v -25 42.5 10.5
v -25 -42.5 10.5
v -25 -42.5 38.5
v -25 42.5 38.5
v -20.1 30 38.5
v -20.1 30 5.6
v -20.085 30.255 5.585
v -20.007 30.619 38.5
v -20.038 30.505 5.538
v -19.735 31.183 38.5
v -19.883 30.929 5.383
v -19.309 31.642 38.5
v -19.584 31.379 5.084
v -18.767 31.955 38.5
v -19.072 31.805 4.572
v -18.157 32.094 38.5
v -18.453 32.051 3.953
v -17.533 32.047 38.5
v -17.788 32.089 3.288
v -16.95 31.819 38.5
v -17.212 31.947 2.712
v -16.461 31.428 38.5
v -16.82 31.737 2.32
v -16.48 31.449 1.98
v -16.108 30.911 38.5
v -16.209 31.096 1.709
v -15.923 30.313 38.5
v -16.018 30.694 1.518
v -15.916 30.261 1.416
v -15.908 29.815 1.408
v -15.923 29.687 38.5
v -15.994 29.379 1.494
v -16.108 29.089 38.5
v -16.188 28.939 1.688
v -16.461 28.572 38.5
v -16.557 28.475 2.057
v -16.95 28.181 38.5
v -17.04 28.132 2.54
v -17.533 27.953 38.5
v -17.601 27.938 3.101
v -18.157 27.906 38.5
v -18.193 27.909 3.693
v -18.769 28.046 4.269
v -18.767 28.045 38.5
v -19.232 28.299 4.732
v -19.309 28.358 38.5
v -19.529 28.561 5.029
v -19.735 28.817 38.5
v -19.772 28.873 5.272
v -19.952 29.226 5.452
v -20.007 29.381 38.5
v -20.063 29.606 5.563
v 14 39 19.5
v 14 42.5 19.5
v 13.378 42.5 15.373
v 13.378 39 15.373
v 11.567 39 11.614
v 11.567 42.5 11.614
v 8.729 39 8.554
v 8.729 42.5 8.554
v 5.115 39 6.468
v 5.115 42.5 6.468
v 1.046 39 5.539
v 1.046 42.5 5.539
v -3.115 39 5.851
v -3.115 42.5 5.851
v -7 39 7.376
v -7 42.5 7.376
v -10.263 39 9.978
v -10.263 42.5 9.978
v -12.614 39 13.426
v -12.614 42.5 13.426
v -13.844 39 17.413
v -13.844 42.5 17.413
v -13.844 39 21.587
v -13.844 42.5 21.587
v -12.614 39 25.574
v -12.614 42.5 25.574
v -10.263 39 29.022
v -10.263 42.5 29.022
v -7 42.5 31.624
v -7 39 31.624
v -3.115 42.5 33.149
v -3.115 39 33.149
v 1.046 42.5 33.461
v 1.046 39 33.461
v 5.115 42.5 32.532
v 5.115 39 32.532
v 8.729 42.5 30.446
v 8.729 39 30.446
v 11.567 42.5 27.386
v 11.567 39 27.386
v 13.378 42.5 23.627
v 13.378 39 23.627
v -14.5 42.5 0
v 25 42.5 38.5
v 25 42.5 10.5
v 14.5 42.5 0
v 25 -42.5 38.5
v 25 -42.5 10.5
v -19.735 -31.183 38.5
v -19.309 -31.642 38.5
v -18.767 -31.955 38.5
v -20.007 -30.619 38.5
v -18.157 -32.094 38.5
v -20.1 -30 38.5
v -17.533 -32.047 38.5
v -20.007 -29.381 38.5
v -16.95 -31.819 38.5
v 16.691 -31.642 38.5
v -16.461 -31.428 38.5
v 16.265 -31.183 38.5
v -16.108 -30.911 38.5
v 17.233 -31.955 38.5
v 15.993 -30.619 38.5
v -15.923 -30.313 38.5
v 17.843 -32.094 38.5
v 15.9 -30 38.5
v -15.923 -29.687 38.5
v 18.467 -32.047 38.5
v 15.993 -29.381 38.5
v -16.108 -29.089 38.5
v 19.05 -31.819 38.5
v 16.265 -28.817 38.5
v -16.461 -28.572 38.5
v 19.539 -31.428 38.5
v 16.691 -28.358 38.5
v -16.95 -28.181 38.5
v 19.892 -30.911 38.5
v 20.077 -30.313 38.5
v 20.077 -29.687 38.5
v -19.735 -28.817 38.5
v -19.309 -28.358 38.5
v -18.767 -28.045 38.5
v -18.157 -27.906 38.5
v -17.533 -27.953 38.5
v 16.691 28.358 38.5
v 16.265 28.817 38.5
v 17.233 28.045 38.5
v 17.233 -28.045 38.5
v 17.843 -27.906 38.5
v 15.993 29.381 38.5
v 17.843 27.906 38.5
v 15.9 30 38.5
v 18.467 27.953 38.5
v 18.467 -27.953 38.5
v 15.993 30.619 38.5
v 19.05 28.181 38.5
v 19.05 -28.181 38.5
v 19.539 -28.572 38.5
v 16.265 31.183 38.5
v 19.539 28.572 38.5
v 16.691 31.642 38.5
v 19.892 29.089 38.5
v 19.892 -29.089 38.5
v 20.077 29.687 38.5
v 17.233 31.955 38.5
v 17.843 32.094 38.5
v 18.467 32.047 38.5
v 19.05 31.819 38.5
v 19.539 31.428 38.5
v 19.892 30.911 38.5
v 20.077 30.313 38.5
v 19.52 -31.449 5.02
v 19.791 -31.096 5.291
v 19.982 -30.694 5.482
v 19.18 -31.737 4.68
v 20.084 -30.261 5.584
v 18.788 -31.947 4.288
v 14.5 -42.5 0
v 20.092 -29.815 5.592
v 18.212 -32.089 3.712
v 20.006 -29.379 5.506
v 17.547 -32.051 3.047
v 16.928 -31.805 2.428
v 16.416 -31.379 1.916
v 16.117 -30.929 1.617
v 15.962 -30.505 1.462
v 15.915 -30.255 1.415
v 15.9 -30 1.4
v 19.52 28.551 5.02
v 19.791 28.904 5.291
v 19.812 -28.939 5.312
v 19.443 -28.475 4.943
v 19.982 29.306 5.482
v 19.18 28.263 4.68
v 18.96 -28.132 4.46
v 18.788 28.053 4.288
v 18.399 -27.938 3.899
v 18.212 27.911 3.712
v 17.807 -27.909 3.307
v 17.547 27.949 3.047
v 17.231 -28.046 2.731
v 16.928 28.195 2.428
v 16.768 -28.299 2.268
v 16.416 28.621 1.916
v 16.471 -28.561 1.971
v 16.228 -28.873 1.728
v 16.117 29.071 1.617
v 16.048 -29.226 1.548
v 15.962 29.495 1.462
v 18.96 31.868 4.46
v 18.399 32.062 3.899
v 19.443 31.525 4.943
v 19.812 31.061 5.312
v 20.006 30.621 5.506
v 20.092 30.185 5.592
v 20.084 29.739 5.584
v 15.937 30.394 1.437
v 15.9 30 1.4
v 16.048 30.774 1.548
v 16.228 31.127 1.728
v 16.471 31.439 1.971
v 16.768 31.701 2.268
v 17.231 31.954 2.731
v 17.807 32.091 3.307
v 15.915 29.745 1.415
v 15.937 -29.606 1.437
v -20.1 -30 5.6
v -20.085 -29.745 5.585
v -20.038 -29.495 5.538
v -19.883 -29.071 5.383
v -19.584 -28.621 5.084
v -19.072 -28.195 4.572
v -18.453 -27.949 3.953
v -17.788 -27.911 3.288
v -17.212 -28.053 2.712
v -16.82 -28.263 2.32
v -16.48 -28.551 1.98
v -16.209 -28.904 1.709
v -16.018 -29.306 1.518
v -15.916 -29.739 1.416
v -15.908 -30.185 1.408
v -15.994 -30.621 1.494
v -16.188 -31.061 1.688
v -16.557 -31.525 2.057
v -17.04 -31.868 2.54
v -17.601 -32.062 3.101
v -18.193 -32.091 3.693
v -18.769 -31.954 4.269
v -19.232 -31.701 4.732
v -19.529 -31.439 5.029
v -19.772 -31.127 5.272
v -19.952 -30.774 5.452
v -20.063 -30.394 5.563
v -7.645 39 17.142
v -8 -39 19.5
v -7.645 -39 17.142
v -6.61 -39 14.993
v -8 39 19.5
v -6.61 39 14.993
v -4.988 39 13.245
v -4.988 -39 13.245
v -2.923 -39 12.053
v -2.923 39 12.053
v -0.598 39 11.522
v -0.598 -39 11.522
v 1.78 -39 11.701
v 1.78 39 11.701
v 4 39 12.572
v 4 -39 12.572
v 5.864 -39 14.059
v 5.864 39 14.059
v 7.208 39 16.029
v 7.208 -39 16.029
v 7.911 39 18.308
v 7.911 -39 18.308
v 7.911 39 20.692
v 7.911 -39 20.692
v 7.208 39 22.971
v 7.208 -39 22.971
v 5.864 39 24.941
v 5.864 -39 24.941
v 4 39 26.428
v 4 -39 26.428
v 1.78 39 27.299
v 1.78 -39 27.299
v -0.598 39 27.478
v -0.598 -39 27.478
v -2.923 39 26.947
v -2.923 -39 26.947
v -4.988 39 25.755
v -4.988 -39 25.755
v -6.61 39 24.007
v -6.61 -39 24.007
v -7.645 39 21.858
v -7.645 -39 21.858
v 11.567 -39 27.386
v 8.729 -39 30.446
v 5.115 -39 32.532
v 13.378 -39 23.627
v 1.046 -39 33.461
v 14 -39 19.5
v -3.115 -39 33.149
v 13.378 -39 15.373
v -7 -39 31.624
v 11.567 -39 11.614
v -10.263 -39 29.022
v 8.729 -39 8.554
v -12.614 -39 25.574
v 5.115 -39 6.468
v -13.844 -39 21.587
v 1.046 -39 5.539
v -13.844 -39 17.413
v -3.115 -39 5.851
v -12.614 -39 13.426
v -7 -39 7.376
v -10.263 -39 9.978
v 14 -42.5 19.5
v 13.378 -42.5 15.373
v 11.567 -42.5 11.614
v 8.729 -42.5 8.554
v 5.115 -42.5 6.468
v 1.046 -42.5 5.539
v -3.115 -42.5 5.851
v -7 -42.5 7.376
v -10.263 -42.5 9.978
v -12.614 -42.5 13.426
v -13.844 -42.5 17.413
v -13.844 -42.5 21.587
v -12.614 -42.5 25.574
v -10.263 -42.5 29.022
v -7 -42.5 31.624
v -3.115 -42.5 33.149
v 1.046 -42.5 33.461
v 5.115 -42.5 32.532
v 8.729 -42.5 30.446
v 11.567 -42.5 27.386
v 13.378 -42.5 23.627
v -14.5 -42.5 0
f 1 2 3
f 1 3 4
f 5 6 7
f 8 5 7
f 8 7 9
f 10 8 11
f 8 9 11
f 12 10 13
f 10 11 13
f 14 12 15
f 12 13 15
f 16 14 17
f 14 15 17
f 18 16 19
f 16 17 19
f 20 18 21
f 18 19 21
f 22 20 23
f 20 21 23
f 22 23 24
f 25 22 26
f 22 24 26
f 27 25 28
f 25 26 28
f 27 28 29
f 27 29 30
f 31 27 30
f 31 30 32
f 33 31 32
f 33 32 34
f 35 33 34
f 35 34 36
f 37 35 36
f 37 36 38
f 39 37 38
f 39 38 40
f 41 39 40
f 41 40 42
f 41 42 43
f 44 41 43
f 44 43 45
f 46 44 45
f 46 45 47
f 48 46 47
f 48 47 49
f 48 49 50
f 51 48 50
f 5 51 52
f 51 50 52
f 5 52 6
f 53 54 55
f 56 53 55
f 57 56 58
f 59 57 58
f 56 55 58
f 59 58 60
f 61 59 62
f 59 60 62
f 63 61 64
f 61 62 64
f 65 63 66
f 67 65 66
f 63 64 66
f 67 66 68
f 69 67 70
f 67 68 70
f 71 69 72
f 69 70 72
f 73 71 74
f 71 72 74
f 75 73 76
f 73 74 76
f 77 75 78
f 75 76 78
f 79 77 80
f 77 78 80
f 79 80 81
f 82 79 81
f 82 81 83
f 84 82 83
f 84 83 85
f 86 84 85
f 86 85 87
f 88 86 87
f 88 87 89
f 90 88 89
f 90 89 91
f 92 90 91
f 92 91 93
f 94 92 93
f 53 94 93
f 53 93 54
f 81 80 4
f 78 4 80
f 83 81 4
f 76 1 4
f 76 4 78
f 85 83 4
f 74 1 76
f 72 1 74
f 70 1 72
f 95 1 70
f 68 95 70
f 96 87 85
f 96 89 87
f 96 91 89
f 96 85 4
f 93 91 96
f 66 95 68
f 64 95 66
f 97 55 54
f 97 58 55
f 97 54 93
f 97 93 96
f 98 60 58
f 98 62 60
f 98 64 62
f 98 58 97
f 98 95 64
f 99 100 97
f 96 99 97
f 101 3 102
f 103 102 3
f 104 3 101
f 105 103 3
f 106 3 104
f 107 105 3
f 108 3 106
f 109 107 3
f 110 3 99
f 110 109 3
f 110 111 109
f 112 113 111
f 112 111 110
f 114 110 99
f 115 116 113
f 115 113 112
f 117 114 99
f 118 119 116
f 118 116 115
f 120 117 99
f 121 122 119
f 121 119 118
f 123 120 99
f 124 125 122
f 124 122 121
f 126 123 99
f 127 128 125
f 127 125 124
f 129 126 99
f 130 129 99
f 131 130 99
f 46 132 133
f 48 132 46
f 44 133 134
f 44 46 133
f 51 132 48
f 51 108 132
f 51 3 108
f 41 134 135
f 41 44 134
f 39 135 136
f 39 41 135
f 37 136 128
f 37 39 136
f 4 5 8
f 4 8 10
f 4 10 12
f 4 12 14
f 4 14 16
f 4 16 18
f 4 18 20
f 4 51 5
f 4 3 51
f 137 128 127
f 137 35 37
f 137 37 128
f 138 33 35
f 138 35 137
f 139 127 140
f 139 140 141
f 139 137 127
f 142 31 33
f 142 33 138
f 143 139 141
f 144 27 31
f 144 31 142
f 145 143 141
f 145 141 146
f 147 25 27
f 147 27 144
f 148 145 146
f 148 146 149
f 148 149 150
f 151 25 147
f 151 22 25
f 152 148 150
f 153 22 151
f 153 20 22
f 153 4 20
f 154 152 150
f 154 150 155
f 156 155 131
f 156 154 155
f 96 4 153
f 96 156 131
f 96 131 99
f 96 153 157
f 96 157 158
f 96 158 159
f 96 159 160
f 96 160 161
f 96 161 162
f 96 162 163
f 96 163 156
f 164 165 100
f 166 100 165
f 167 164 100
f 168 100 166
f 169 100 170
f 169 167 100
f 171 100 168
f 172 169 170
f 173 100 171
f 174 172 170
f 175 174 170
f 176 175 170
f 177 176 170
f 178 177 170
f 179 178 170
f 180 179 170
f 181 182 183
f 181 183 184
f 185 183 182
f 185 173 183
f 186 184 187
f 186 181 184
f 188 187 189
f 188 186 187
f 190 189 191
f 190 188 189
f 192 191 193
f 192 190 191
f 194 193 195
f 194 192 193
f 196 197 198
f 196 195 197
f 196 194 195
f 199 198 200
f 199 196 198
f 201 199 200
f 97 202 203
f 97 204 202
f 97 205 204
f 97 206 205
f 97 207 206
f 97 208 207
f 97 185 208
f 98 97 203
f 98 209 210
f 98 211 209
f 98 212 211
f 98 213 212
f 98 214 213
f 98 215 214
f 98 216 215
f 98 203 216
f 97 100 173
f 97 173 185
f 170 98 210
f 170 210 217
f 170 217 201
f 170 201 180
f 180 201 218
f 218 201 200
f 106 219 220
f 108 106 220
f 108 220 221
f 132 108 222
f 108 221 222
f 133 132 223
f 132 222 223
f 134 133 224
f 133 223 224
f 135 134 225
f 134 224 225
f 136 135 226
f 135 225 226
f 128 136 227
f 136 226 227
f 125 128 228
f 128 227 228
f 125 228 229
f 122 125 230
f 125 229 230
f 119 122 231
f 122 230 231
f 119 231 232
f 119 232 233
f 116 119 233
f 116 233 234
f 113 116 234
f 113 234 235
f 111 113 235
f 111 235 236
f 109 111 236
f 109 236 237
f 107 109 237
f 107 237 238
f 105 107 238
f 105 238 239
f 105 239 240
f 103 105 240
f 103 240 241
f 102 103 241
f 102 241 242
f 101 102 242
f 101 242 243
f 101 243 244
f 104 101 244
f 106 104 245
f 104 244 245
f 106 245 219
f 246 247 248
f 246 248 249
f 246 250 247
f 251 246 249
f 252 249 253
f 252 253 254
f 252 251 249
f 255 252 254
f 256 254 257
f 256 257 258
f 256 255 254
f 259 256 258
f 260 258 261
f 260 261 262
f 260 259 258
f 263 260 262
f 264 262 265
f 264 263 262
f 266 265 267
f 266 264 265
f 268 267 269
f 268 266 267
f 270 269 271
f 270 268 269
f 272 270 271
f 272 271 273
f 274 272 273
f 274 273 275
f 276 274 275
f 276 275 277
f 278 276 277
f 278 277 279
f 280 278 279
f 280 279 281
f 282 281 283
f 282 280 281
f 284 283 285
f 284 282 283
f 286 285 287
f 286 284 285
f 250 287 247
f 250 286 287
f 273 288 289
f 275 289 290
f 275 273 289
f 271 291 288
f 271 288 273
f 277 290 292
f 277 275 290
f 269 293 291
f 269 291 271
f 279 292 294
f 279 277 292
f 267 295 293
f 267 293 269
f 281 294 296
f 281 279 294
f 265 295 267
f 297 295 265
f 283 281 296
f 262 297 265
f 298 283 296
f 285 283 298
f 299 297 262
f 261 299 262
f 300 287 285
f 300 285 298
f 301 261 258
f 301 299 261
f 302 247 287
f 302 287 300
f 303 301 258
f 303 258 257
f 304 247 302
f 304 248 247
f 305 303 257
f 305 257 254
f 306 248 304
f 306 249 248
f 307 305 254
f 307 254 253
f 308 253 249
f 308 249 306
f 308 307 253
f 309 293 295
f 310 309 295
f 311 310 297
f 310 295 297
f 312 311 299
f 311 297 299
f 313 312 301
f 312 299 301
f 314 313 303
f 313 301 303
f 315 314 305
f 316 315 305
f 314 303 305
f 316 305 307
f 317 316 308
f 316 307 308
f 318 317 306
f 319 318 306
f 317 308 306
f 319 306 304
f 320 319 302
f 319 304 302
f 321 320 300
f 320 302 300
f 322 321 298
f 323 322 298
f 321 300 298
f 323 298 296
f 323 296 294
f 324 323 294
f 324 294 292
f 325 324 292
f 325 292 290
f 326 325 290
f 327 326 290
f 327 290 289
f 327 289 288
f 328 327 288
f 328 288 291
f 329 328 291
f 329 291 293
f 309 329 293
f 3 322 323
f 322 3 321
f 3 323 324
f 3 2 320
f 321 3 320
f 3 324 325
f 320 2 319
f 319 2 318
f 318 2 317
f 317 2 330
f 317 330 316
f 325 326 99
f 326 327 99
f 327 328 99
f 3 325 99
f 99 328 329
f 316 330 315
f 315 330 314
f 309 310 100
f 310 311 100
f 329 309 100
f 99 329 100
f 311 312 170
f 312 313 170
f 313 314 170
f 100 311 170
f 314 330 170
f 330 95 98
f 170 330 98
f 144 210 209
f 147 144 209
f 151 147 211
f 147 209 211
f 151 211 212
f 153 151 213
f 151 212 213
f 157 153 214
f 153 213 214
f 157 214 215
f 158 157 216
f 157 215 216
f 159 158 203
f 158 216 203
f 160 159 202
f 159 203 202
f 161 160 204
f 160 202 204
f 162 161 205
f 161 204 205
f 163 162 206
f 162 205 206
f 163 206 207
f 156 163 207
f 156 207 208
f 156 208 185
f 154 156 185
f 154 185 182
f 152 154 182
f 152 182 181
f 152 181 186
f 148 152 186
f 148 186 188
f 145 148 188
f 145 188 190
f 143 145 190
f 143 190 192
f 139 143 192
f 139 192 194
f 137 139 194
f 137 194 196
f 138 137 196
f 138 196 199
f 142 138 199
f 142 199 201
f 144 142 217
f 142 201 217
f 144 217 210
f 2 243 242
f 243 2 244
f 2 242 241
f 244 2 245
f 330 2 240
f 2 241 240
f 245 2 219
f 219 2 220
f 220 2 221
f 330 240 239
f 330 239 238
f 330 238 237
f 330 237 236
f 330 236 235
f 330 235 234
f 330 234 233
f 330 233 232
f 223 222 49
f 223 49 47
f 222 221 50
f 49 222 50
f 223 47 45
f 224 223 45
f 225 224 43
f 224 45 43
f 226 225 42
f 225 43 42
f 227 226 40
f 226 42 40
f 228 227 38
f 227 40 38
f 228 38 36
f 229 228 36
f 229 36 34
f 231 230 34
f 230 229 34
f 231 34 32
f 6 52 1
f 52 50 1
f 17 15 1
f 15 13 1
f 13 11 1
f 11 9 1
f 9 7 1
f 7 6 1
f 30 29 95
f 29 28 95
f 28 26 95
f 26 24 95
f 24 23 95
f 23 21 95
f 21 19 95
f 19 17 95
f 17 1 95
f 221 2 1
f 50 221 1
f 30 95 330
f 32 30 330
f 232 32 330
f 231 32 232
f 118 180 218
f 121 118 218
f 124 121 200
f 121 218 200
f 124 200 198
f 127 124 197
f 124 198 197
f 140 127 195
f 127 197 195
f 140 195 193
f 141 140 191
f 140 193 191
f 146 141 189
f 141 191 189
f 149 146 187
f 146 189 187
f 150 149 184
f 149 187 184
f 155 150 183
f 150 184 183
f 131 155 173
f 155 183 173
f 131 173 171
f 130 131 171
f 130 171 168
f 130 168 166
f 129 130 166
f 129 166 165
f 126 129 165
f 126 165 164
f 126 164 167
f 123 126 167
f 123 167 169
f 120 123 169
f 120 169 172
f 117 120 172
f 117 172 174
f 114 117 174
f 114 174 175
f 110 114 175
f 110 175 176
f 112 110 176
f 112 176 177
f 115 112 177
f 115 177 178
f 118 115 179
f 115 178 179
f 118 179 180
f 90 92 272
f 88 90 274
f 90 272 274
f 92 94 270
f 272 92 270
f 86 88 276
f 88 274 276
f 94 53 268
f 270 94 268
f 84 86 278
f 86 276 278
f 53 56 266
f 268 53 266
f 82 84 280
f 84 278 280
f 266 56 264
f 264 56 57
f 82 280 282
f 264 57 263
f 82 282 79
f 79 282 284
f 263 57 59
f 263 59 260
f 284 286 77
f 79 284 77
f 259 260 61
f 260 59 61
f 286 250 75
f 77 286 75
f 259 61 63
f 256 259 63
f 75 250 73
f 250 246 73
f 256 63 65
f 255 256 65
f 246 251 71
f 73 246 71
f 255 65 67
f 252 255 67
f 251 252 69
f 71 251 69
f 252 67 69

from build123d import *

# Parameters (mm, degrees)
SKETCH1_W           = 50
SKETCH1_H           = 85
BOSS_EXTRUDE1_DEPTH = 38.5
M5_TAPPED_HOLE1_D   = 4.2
SKETCH6_R           = 14
CUT_EXTRUDE1_DEPTH  = 86
SKETCH8_R           = 14
SKETCH8_R_2         = 8
BOSS_EXTRUDE2_DEPTH = 39


with BuildPart() as part:
    # Sketch1 → Boss-Extrude1 (new body)
    with BuildSketch(Plane.XY):
        Rectangle(SKETCH1_W, SKETCH1_H)
    extrude(amount=BOSS_EXTRUDE1_DEPTH)

    # M5 Tapped Hole1 (through all)
    with Locations(Plane.XY.offset(38.5)):
        with Locations((-18, 30), (18, 30), (18, -30), (-18, -30)):
            Hole(M5_TAPPED_HOLE1_D / 2)

    # Sketch6 → Cut-Extrude1 (cut, through all)
    with BuildSketch(Plane(origin=(0, 42.5, 0), x_dir=(1, 0, 0), z_dir=(0, 1, 0))):
        with Locations((0, -19.5)):
            Circle(SKETCH6_R)
        Polygon((-25, -10.5), (-14.5, 0), (-25, 0), align=None)
        Polygon((25, -10.5), (14.5, 0), (25, 0), align=None)
    extrude(amount=-CUT_EXTRUDE1_DEPTH, mode=Mode.SUBTRACT)

    # Sketch8 → Boss-Extrude2 (add, symmetric)
    with BuildSketch(Plane(origin=(0, 0, 0), x_dir=(-1, 0, 0), z_dir=(0, -1, 0))):
        with Locations((0, -19.5)):
            Circle(SKETCH8_R)
        with Locations((0, -19.5)):
            Circle(SKETCH8_R_2, mode=Mode.SUBTRACT)
    extrude(amount=BOSS_EXTRUDE2_DEPTH, both=True)


solid = part.part
